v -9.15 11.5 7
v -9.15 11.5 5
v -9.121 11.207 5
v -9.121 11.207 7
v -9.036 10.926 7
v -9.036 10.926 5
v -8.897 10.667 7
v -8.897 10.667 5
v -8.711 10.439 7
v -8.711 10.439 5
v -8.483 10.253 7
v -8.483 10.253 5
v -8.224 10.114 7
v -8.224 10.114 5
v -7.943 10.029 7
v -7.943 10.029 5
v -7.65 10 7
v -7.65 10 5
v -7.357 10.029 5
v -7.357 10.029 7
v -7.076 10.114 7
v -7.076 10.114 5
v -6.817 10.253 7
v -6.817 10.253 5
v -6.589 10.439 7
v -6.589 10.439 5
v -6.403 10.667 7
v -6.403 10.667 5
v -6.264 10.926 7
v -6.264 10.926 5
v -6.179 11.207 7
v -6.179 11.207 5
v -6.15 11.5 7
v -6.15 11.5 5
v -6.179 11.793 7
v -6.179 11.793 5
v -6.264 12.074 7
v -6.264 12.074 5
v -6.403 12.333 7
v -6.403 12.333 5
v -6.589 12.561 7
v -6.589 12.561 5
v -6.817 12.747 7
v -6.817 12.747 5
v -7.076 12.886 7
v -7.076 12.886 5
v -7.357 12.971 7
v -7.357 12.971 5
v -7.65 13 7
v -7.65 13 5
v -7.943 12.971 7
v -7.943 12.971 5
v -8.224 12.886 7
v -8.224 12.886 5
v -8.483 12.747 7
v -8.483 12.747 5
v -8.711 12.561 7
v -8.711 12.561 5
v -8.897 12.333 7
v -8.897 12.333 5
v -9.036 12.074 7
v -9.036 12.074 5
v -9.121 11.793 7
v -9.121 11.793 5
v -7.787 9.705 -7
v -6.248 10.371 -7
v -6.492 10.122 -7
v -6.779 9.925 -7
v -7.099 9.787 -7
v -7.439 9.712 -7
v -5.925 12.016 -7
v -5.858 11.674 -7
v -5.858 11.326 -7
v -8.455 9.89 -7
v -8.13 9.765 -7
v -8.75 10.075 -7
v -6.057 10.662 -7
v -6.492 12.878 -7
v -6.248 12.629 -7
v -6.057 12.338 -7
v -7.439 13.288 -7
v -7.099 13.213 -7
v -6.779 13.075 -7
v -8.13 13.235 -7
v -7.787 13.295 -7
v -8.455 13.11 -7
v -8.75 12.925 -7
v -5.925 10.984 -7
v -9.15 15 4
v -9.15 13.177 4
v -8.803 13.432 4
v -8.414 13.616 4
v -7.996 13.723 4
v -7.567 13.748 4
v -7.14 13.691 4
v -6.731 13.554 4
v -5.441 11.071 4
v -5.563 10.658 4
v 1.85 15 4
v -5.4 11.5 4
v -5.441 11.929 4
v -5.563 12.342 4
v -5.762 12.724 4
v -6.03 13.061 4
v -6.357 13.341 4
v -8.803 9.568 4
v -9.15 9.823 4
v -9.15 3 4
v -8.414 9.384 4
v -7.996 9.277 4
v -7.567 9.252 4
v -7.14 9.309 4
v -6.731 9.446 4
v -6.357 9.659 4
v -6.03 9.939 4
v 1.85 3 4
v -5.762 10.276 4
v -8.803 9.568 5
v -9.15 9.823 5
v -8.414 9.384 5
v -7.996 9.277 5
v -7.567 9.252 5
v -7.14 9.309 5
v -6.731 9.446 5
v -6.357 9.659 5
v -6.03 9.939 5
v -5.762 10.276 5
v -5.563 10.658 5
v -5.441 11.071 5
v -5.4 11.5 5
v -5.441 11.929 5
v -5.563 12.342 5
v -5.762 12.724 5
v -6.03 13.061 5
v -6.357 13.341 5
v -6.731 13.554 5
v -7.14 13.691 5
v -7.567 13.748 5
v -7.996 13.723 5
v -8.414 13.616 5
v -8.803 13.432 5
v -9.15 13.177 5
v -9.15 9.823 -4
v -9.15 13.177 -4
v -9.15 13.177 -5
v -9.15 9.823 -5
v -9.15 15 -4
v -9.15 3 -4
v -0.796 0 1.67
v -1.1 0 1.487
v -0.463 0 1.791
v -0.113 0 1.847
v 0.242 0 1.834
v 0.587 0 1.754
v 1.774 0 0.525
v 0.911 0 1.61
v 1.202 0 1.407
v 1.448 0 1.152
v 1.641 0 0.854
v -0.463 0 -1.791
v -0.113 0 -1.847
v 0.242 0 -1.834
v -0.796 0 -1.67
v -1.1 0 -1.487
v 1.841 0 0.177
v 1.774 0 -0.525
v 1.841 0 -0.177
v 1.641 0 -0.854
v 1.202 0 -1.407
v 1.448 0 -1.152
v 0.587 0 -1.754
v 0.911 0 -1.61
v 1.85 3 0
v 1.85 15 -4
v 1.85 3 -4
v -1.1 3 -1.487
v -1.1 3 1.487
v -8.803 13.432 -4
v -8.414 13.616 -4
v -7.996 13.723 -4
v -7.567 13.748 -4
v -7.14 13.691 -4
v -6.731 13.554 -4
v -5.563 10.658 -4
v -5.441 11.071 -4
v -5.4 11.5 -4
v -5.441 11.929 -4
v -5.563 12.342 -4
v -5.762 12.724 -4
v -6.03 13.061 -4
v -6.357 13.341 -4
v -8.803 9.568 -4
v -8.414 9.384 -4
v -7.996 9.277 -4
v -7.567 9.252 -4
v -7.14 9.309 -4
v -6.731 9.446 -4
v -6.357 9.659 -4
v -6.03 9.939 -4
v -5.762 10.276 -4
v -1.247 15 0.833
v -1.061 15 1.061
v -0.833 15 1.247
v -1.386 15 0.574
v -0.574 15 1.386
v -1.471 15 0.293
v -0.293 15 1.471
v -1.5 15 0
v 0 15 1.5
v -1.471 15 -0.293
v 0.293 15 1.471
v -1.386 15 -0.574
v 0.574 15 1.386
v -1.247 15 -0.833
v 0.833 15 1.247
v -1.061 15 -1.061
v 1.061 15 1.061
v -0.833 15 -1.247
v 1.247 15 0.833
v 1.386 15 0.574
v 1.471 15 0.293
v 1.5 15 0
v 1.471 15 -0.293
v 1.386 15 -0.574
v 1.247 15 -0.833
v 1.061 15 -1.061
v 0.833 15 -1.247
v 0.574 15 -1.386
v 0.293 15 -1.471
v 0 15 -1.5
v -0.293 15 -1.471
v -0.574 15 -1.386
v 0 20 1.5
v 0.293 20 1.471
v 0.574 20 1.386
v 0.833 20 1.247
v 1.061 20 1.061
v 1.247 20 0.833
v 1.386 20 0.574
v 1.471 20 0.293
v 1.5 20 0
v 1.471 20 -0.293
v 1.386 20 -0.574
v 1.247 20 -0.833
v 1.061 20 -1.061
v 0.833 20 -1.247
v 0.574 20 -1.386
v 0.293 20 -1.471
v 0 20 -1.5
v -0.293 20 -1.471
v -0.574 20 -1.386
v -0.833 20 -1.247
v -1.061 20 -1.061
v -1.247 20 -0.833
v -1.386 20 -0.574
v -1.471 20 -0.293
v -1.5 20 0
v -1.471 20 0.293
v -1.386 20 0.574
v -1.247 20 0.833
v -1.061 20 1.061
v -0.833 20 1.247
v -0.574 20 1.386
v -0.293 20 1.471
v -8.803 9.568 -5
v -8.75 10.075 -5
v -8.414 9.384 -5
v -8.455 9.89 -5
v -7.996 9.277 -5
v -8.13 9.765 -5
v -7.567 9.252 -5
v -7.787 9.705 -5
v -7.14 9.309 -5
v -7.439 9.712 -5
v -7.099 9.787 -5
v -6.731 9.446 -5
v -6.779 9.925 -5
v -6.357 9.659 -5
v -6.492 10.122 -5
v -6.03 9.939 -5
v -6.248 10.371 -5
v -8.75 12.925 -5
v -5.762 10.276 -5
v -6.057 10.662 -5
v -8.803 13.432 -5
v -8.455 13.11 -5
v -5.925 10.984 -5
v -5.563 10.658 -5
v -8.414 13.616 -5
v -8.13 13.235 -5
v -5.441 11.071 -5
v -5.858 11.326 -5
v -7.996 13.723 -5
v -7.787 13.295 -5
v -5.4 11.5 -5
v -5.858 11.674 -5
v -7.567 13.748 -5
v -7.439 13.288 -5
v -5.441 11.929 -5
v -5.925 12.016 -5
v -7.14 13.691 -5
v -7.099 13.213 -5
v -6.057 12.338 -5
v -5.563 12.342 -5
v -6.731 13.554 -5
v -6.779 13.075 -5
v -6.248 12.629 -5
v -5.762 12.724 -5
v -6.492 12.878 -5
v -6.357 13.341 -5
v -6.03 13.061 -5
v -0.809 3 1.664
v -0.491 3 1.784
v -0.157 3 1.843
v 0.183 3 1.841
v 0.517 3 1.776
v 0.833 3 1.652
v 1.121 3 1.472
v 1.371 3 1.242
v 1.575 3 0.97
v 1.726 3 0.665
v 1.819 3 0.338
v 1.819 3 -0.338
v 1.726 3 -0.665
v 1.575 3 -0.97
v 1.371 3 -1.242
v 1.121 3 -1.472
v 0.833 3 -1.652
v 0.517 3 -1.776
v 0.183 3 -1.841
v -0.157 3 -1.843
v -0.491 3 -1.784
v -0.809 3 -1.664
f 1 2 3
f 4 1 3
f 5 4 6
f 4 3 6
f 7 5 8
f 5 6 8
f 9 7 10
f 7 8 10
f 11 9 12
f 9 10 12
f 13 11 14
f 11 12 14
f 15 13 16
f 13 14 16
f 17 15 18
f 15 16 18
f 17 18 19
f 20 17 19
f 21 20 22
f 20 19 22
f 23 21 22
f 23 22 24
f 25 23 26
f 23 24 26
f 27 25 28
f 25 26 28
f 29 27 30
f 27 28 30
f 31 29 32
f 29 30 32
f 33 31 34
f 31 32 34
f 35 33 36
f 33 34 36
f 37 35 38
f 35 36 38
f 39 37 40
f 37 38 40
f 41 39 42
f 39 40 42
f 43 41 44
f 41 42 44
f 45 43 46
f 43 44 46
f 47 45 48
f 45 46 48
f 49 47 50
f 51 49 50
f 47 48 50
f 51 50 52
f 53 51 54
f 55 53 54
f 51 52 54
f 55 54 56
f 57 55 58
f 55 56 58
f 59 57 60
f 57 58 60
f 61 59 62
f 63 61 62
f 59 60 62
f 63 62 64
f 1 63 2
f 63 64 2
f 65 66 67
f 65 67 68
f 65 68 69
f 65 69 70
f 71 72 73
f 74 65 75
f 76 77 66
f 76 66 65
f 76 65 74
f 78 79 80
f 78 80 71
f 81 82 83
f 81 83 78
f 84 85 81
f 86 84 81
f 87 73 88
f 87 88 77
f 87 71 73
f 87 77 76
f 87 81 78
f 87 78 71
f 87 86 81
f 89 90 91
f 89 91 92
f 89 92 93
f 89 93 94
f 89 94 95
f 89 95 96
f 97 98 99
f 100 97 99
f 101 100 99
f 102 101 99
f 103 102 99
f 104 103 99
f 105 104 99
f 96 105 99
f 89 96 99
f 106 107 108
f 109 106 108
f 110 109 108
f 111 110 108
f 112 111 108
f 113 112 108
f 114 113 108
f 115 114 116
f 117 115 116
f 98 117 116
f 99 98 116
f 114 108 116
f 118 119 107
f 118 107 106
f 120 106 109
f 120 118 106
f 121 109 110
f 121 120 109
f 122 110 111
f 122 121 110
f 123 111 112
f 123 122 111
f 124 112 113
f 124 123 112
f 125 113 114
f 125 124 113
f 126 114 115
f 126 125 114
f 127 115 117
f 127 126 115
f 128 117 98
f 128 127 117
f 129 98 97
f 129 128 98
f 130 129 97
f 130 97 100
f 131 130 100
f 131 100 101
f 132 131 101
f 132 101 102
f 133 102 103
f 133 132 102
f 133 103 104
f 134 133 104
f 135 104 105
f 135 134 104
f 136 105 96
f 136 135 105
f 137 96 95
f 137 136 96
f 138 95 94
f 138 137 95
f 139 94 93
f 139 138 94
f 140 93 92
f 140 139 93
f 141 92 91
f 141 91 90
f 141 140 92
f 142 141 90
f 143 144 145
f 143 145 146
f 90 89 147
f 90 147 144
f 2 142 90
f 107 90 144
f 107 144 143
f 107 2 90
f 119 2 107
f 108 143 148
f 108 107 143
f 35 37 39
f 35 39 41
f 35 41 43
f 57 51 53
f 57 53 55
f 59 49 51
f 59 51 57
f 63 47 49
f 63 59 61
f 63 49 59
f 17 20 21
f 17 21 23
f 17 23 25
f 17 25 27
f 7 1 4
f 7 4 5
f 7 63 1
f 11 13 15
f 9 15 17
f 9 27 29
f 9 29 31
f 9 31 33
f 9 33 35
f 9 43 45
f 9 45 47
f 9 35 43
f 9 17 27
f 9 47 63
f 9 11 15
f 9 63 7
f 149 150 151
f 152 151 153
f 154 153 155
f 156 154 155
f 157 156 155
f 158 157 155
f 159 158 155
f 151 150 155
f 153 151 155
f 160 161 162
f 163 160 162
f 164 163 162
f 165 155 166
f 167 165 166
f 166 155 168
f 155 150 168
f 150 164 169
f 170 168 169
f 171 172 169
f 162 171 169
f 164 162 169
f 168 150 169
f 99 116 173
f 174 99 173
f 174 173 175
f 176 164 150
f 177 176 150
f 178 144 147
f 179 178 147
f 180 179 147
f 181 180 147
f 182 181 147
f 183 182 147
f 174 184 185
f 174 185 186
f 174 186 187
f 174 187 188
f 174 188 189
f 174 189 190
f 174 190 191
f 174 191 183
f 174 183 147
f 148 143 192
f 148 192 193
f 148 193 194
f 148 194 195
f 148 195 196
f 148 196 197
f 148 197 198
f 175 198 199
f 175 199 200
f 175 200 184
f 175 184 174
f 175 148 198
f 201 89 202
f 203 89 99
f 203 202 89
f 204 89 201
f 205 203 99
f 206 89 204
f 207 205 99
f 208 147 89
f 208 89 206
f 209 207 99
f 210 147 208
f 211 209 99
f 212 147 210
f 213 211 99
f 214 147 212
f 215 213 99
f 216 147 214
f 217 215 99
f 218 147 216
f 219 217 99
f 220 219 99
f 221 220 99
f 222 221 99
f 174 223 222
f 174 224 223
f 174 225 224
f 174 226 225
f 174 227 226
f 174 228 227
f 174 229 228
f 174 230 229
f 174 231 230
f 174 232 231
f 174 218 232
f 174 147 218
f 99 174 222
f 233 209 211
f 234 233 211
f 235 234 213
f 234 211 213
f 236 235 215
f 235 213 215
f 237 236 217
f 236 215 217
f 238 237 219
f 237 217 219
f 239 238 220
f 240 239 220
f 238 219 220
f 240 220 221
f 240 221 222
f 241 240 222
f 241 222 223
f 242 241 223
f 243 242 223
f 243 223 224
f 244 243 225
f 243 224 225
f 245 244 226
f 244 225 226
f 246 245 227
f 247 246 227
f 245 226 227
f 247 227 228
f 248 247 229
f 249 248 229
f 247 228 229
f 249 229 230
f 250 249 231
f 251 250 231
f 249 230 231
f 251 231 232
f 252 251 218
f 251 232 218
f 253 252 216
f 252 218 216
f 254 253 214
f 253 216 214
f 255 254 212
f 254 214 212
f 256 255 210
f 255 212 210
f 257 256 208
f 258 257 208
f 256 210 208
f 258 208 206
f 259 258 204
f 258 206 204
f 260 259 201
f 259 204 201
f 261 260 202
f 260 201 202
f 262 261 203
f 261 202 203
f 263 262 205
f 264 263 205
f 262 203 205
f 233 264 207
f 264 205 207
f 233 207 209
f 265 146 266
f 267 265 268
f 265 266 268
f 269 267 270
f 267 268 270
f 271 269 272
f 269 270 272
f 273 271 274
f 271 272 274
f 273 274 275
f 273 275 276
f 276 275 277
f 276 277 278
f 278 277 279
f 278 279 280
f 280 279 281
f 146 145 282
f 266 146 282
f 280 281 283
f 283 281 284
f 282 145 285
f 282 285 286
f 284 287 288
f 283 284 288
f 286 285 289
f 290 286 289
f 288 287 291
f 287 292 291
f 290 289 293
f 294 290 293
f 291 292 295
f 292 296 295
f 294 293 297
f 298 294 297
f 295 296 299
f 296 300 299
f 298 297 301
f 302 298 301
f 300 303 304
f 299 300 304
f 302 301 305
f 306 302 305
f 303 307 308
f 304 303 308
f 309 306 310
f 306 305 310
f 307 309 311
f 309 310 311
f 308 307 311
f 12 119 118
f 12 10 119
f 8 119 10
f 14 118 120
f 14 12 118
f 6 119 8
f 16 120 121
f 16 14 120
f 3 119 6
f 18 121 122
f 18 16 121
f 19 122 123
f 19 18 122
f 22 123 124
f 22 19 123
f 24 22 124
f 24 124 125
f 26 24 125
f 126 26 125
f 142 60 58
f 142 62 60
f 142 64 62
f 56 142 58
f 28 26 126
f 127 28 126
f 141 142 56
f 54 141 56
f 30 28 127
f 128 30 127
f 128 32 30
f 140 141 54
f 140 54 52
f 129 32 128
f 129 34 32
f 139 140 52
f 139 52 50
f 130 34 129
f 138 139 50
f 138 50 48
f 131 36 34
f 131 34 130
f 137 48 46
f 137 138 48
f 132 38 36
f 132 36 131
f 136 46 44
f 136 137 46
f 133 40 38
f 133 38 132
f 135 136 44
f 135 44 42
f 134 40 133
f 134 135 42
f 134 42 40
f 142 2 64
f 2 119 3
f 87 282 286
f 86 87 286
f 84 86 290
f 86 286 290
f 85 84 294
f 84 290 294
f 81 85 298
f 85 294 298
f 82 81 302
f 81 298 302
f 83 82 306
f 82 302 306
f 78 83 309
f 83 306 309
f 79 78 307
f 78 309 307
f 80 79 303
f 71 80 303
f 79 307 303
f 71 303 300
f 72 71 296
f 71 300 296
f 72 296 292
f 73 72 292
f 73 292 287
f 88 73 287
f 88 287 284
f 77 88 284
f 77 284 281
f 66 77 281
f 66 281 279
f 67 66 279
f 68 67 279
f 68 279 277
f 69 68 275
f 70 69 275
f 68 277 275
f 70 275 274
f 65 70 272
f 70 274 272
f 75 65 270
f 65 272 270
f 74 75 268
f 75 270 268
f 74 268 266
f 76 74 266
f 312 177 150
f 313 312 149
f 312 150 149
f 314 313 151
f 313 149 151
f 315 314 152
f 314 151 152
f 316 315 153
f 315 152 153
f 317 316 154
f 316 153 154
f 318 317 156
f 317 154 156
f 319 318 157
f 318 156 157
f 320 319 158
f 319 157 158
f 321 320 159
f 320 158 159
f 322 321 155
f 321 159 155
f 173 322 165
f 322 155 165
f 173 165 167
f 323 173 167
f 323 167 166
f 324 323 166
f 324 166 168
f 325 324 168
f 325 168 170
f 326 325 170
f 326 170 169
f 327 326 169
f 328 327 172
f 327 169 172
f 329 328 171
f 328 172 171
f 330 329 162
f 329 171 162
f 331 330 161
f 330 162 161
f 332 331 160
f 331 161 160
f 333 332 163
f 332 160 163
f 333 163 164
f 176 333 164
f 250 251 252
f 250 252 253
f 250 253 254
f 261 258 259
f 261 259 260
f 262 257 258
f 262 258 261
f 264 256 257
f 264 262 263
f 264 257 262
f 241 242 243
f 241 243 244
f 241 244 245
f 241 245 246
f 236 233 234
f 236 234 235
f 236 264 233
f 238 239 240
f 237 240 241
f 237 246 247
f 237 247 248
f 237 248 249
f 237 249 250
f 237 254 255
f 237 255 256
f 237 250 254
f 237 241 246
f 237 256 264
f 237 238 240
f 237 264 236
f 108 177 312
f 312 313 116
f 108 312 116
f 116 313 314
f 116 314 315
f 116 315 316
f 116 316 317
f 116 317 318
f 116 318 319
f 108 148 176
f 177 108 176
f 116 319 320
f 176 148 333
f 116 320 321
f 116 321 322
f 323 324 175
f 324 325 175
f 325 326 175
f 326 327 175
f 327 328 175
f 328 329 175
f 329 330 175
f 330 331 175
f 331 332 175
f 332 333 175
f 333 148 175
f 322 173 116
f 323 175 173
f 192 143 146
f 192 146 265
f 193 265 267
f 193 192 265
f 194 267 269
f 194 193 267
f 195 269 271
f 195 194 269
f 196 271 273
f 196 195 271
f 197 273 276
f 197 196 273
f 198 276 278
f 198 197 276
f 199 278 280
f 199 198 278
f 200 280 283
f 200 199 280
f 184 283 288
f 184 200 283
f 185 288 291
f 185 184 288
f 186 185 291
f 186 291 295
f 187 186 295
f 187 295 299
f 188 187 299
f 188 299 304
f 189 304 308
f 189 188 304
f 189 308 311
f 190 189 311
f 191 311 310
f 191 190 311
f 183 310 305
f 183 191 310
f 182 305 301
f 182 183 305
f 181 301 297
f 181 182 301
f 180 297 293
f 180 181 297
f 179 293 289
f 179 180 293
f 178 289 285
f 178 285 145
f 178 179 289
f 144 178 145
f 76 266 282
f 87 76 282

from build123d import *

# Parameters (mm, degrees)
BOSS_EXTRUDE1_DEPTH = 3
SKETCH2_W           = 11
SKETCH2_H           = 8
BOSS_EXTRUDE2_DEPTH = 12
SKETCH4_R           = 1.5
BOSS_EXTRUDE4_DEPTH = 5
BOSS_EXTRUDE5_DEPTH = 5
SKETCH3_R           = 1.5
BOSS_EXTRUDE3_DEPTH = 2
BOSS_EXTRUDE6_DEPTH = 2


with BuildPart() as part:
    # Sketch1 → Boss-Extrude1 (new body)
    with BuildSketch(Plane(origin=(0, 0, 0), x_dir=(1, 0, 0), z_dir=(0, 1, 0))):
        with BuildLine():
            Line((-1.1, 1.487447478), (-1.1, -1.487447478))
            ThreePointArc((-1.1, -1.487447478), (1.85, 0), (-1.1, 1.487447478))
        make_face()
    extrude(amount=BOSS_EXTRUDE1_DEPTH)

    # Sketch2 → Boss-Extrude2 (add)
    with BuildSketch(Plane(origin=(0, 3, 0), x_dir=(1, 0, 0), z_dir=(0, 1, 0))):
        with Locations((-3.65, 0)):
            Rectangle(SKETCH2_W, SKETCH2_H)
    extrude(amount=BOSS_EXTRUDE2_DEPTH)

    # Sketch4 → Boss-Extrude4 (add)
    with BuildSketch(Plane(origin=(0, 15, 0), x_dir=(1, 0, 0), z_dir=(0, 1, 0))):
        with Locations(Location((0, 0, 0), (0, 0, 270))):
            Circle(SKETCH4_R)
    extrude(amount=BOSS_EXTRUDE4_DEPTH)

    # Sketch5 → Boss-Extrude5 (add, symmetric)
    with BuildSketch(Plane.XY):
        with BuildLine():
            Line((-9.15, 13.177050983), (-9.15, 9.822949017))
            ThreePointArc((-9.15, 9.822949017), (-5.4, 11.5), (-9.15, 13.177050983))
        make_face()
    extrude(amount=BOSS_EXTRUDE5_DEPTH, both=True)

    # Sketch3 → Boss-Extrude3 (add)
    with BuildSketch(Plane.XY.offset(5)):
        with Locations(Location((-7.65, 11.5, 0), (0, 0, 180))):
            Circle(SKETCH3_R)
    extrude(amount=BOSS_EXTRUDE3_DEPTH)

    # Sketch6 → Boss-Extrude6 (add)
    with BuildSketch(Plane(origin=(0, 0, -5), x_dir=(-1, 0, 0), z_dir=(0, 0, -1))):
        with BuildLine():
            Line((8.75, 10.075219315), (8.75, 12.924780685))
            ThreePointArc((8.75, 12.924780685), (5.85, 11.5), (8.75, 10.075219315))
        make_face()
    extrude(amount=BOSS_EXTRUDE6_DEPTH)


solid = part.part
